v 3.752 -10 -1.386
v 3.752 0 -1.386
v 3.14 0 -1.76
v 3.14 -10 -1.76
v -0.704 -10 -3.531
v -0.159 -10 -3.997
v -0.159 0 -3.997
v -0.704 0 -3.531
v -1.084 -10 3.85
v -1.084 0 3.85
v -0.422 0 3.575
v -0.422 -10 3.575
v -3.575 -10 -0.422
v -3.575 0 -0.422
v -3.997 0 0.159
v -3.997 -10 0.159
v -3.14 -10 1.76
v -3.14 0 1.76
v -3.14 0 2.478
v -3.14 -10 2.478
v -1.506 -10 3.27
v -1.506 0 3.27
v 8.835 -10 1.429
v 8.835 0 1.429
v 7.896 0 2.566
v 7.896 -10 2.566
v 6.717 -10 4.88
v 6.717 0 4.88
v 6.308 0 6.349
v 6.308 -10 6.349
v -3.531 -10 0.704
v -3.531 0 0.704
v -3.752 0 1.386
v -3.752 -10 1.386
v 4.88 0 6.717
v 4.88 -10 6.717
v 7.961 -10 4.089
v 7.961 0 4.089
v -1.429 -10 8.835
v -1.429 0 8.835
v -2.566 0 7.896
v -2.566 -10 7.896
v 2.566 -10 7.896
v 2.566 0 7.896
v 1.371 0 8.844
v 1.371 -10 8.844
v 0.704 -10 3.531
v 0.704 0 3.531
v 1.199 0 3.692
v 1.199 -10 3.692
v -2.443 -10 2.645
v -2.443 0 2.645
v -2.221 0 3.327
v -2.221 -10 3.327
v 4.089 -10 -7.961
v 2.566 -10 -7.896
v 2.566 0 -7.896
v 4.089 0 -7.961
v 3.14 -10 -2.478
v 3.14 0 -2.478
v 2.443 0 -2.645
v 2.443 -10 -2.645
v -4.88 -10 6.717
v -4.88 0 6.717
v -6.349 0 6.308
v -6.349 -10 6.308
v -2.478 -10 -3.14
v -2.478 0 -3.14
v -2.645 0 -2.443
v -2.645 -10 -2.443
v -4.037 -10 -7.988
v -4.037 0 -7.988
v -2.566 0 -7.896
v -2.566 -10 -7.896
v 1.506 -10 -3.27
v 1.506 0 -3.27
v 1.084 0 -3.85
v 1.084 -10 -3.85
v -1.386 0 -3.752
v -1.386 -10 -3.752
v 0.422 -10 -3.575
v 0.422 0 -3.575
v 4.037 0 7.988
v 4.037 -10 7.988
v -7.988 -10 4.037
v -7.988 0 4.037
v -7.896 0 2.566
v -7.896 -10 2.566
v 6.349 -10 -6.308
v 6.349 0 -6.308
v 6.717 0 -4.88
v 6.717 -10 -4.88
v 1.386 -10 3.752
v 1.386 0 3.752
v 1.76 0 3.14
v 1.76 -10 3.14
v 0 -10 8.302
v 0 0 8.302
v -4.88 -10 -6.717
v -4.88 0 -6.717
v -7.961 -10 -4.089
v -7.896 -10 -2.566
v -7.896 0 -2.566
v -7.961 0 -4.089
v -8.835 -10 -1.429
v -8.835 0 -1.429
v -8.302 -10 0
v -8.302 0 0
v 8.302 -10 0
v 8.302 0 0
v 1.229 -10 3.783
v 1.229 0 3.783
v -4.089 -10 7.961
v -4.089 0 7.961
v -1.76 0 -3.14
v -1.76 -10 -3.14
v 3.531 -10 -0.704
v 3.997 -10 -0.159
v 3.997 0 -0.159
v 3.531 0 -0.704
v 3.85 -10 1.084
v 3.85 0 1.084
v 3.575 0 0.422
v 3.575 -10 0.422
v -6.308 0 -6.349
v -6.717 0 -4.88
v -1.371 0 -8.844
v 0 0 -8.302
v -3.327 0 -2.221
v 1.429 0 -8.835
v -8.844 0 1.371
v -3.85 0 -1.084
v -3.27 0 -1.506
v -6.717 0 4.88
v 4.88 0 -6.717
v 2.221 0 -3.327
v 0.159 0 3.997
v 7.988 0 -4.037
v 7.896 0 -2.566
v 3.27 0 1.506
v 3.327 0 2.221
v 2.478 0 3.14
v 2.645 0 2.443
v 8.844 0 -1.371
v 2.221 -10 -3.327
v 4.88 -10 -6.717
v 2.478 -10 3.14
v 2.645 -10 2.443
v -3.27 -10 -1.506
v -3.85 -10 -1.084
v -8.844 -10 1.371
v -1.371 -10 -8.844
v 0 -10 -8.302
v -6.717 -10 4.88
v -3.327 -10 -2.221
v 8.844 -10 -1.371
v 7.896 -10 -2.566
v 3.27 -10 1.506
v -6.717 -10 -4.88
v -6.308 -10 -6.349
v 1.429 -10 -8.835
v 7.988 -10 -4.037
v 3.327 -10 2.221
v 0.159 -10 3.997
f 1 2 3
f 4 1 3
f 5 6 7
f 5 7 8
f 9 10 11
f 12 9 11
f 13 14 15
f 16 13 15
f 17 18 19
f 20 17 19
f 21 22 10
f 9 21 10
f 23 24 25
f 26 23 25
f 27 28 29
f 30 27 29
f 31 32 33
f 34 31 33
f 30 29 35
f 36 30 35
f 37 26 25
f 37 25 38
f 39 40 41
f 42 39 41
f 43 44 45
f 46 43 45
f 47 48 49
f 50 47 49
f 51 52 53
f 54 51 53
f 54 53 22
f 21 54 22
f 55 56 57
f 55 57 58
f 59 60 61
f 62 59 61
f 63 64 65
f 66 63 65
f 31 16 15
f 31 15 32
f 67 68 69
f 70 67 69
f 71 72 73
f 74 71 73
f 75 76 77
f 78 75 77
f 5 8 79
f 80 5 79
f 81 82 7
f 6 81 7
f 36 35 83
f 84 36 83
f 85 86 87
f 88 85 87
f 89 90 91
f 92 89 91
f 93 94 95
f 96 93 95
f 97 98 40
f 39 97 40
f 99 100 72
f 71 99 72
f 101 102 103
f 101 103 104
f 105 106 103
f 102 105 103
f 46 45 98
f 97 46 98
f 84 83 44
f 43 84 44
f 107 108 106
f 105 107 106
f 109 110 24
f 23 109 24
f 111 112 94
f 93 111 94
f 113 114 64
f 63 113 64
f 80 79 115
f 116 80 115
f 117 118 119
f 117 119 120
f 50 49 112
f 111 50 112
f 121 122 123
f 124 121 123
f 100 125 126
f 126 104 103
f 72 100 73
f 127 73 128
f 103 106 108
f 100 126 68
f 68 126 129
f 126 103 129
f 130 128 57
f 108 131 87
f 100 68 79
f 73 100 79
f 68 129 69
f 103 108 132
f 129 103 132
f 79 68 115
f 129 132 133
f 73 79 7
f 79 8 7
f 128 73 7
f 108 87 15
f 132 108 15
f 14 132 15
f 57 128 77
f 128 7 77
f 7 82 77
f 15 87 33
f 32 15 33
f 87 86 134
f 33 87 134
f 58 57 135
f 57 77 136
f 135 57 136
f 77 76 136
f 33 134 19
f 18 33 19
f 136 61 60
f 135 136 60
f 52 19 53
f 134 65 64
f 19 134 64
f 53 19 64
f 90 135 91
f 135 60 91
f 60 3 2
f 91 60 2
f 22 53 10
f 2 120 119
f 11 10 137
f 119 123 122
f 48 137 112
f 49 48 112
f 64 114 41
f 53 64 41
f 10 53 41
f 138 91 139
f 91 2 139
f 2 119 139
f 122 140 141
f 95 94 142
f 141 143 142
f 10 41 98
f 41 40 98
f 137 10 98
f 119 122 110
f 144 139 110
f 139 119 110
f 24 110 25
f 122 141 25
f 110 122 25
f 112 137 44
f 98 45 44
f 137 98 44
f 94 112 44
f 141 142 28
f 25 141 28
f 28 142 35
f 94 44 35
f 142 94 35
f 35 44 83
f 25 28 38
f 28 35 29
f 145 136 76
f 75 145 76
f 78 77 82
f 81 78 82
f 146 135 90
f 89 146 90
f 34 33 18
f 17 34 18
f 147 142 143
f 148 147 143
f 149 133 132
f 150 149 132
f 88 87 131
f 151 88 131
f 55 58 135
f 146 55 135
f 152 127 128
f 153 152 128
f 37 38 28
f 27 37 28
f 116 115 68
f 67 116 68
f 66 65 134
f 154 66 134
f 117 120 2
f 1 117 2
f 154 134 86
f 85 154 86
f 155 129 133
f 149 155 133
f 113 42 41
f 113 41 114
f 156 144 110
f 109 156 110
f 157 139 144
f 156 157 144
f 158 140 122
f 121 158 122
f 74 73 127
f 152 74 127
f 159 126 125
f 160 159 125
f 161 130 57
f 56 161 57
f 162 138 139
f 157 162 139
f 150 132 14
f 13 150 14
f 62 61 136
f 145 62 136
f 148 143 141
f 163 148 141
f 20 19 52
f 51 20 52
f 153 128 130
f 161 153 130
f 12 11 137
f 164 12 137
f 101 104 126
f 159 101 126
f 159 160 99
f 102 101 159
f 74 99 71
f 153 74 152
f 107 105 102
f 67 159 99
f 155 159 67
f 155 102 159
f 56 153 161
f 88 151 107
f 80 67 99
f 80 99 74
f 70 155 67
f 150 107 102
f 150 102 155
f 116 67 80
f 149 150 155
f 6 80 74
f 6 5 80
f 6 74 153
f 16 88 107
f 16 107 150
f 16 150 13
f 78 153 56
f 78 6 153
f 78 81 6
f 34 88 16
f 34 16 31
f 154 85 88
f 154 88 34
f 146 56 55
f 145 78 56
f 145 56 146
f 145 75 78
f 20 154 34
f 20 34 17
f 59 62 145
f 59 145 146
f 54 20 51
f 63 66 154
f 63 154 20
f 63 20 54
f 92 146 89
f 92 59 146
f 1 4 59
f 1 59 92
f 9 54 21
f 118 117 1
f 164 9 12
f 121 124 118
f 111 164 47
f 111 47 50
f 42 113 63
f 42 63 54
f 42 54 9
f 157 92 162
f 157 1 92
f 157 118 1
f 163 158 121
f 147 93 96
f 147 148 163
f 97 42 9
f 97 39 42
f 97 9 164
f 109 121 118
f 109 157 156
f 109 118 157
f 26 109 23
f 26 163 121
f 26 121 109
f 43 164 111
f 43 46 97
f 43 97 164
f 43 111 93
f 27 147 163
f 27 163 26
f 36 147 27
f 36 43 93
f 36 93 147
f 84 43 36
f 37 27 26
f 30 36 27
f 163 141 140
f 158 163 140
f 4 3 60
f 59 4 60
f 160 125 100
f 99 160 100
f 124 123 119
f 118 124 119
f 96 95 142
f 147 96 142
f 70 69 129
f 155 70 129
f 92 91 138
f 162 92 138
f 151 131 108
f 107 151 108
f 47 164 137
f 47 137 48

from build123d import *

# Parameters (mm, degrees)
F1_DEPTH = 10


with BuildPart() as f1:
    # F0 (on Front) → F1 (new body)
    with BuildSketch(Plane.XZ):
        Polygon((2.5655252267, -7.8958747543), (4.8799189691, -6.7166322424), (6.7166322424, -4.8799189691), (7.8958747543, -2.5655252267), (8.3022140315, 0), (7.8958747543, 2.5655252267), (6.7166322424, 4.8799189691), (4.8799189691, 6.7166322424), (2.5655252267, 7.8958747543), (0, 8.3022140315), (-2.5655252267, 7.8958747543), (-4.8799189691, 6.7166322424), (-6.7166322424, 4.8799189691), (-7.8958747543, 2.5655252267), (-8.3022140315, 0), (-7.8958747543, -2.5655252267), (-6.7166322424, -4.8799189691), (-4.8799189691, -6.7166322424), (-2.5655252267, -7.8958747543), (0, -8.3022140315), align=None)
        Polygon((0.1586110624, 3.9968540793), (1.2293142469, 3.7834402195), (1.385943919, 3.752220603), (2.4776109283, 3.1402936308), (3.3267521175, 2.2209728384), (3.8502476305, 1.0842477501), (3.9968540793, -0.1586110624), (3.752220603, -1.385943919), (3.1402936308, -2.4776109283), (2.2209728384, -3.3267521175), (1.0842477501, -3.8502476305), (-0.1586110624, -3.9968540793), (-1.385943919, -3.752220603), (-2.4776109283, -3.1402936308), (-3.3267521175, -2.2209728384), (-3.8502476305, -1.0842477501), (-3.9968540793, 0.1586110624), (-3.752220603, 1.385943919), (-3.1402936308, 2.4776109283), (-2.2209728384, 3.3267521175), (-1.0842477501, 3.8502476305), align=None, mode=Mode.SUBTRACT)
        Polygon((-6.3492907419, 6.3078528102), (-6.7166322424, 4.8799189691), (-4.8799189691, 6.7166322424), align=None)
        Polygon((-4.8799189691, 6.7166322424), (-2.5655252267, 7.8958747543), (-4.0893006175, 7.9611632604), align=None)
        Polygon((-2.5655252267, 7.8958747543), (0, 8.3022140315), (-1.4290212569, 8.8351795821), align=None)
        Polygon((0, 8.3022140315), (2.5655252267, 7.8958747543), (1.3711406609, 8.8443469679), align=None)
        Polygon((2.5655252267, 7.8958747543), (4.8799189691, 6.7166322424), (4.0370857775, 7.9877680503), align=None)
        Polygon((4.8799189691, 6.7166322424), (6.7166322424, 4.8799189691), (6.3078528102, 6.3492907419), align=None)
        Polygon((6.7166322424, 4.8799189691), (7.8958747543, 2.5655252267), (7.9611632604, 4.0893006175), align=None)
        Polygon((7.8958747543, 2.5655252267), (8.3022140315, 0), (8.8351795821, 1.4290212569), align=None)
        Polygon((8.3022140315, 0), (7.8958747543, -2.5655252267), (8.8443469679, -1.3711406609), align=None)
        Polygon((7.8958747543, -2.5655252267), (6.7166322424, -4.8799189691), (7.9877680503, -4.0370857775), align=None)
        Polygon((6.7166322424, -4.8799189691), (4.8799189691, -6.7166322424), (6.3492907419, -6.3078528102), align=None)
        Polygon((4.0893006175, -7.9611632604), (4.8799189691, -6.7166322424), (2.5655252267, -7.8958747543), align=None)
        Polygon((1.4290212569, -8.8351795821), (2.5655252267, -7.8958747543), (0, -8.3022140315), align=None)
        Polygon((-1.3711406609, -8.8443469679), (0, -8.3022140315), (-2.5655252267, -7.8958747543), align=None)
        Polygon((-4.0370857775, -7.9877680503), (-2.5655252267, -7.8958747543), (-4.8799189691, -6.7166322424), align=None)
        Polygon((-6.3078528102, -6.3492907419), (-4.8799189691, -6.7166322424), (-6.7166322424, -4.8799189691), align=None)
        Polygon((-7.9611632604, -4.0893006175), (-6.7166322424, -4.8799189691), (-7.8958747543, -2.5655252267), align=None)
        Polygon((-8.8351795821, -1.4290212569), (-7.8958747543, -2.5655252267), (-8.3022140315, 0), align=None)
        Polygon((-7.9877680503, 4.0370857775), (-7.8958747543, 2.5655252267), (-6.7166322424, 4.8799189691), align=None)
        Polygon((-8.8443469679, 1.3711406609), (-8.3022140315, 0), (-7.8958747543, 2.5655252267), align=None)
        Polygon((-1.760271545, -3.1402936308), (-2.4776109283, -3.1402936308), (-1.385943919, -3.752220603), align=None)
        Polygon((-0.7037136241, -3.5305505428), (-1.385943919, -3.752220603), (-0.1586110624, -3.9968540793), align=None)
        Polygon((-0.1586110624, -3.9968540793), (1.0842477501, -3.8502476305), (0.4217286894, -3.5752125689), align=None)
        Polygon((1.0842477501, -3.8502476305), (2.2209728384, -3.3267521175), (1.5058892605, -3.2699078787), align=None)
        Polygon((2.2209728384, -3.3267521175), (3.1402936308, -2.4776109283), (2.4426428986, -2.6445218226), align=None)
        Polygon((3.1402936308, -2.4776109283), (3.752220603, -1.385943919), (3.1402936308, -1.760271545), align=None)
        Polygon((3.752220603, -1.385943919), (3.9968540793, -0.1586110624), (3.5305505428, -0.7037136241), align=None)
        Polygon((3.9968540793, -0.1586110624), (3.8502476305, 1.0842477501), (3.5752125689, 0.4217286894), align=None)
        Polygon((3.8502476305, 1.0842477501), (3.3267521175, 2.2209728384), (3.2699078787, 1.5058892605), align=None)
        Polygon((3.3267521175, 2.2209728384), (2.4776109283, 3.1402936308), (2.6445218226, 2.4426428986), align=None)
        Polygon((2.4776109283, 3.1402936308), (1.385943919, 3.752220603), (1.760271545, 3.1402936308), align=None)
        Polygon((-3.2699078787, -1.5058892605), (-3.8502476305, -1.0842477501), (-3.3267521175, -2.2209728384), align=None)
        Polygon((-2.4426428986, 2.6445218226), (-2.2209728384, 3.3267521175), (-3.1402936308, 2.4776109283), align=None)
        Polygon((-1.5058892605, 3.2699078787), (-1.0842477501, 3.8502476305), (-2.2209728384, 3.3267521175), align=None)
        Polygon((-0.4217286894, 3.5752125689), (0.1586110624, 3.9968540793), (-1.0842477501, 3.8502476305), align=None)
        Polygon((-3.1402936308, 1.760271545), (-3.1402936308, 2.4776109283), (-3.752220603, 1.385943919), align=None)
        Polygon((-3.5305505428, 0.7037136241), (-3.752220603, 1.385943919), (-3.9968540793, 0.1586110624), align=None)
        Polygon((-3.5752125689, -0.4217286894), (-3.9968540793, 0.1586110624), (-3.8502476305, -1.0842477501), align=None)
        Polygon((-2.6445218226, -2.4426428986), (-3.3267521175, -2.2209728384), (-2.4776109283, -3.1402936308), align=None)
        Polygon((1.1994854323, 3.6916365681), (1.2293142469, 3.7834402195), (0.1586110624, 3.9968540793), (0.7037136241, 3.5305505428), align=None)
    extrude(amount=F1_DEPTH)


solid = f1.part
